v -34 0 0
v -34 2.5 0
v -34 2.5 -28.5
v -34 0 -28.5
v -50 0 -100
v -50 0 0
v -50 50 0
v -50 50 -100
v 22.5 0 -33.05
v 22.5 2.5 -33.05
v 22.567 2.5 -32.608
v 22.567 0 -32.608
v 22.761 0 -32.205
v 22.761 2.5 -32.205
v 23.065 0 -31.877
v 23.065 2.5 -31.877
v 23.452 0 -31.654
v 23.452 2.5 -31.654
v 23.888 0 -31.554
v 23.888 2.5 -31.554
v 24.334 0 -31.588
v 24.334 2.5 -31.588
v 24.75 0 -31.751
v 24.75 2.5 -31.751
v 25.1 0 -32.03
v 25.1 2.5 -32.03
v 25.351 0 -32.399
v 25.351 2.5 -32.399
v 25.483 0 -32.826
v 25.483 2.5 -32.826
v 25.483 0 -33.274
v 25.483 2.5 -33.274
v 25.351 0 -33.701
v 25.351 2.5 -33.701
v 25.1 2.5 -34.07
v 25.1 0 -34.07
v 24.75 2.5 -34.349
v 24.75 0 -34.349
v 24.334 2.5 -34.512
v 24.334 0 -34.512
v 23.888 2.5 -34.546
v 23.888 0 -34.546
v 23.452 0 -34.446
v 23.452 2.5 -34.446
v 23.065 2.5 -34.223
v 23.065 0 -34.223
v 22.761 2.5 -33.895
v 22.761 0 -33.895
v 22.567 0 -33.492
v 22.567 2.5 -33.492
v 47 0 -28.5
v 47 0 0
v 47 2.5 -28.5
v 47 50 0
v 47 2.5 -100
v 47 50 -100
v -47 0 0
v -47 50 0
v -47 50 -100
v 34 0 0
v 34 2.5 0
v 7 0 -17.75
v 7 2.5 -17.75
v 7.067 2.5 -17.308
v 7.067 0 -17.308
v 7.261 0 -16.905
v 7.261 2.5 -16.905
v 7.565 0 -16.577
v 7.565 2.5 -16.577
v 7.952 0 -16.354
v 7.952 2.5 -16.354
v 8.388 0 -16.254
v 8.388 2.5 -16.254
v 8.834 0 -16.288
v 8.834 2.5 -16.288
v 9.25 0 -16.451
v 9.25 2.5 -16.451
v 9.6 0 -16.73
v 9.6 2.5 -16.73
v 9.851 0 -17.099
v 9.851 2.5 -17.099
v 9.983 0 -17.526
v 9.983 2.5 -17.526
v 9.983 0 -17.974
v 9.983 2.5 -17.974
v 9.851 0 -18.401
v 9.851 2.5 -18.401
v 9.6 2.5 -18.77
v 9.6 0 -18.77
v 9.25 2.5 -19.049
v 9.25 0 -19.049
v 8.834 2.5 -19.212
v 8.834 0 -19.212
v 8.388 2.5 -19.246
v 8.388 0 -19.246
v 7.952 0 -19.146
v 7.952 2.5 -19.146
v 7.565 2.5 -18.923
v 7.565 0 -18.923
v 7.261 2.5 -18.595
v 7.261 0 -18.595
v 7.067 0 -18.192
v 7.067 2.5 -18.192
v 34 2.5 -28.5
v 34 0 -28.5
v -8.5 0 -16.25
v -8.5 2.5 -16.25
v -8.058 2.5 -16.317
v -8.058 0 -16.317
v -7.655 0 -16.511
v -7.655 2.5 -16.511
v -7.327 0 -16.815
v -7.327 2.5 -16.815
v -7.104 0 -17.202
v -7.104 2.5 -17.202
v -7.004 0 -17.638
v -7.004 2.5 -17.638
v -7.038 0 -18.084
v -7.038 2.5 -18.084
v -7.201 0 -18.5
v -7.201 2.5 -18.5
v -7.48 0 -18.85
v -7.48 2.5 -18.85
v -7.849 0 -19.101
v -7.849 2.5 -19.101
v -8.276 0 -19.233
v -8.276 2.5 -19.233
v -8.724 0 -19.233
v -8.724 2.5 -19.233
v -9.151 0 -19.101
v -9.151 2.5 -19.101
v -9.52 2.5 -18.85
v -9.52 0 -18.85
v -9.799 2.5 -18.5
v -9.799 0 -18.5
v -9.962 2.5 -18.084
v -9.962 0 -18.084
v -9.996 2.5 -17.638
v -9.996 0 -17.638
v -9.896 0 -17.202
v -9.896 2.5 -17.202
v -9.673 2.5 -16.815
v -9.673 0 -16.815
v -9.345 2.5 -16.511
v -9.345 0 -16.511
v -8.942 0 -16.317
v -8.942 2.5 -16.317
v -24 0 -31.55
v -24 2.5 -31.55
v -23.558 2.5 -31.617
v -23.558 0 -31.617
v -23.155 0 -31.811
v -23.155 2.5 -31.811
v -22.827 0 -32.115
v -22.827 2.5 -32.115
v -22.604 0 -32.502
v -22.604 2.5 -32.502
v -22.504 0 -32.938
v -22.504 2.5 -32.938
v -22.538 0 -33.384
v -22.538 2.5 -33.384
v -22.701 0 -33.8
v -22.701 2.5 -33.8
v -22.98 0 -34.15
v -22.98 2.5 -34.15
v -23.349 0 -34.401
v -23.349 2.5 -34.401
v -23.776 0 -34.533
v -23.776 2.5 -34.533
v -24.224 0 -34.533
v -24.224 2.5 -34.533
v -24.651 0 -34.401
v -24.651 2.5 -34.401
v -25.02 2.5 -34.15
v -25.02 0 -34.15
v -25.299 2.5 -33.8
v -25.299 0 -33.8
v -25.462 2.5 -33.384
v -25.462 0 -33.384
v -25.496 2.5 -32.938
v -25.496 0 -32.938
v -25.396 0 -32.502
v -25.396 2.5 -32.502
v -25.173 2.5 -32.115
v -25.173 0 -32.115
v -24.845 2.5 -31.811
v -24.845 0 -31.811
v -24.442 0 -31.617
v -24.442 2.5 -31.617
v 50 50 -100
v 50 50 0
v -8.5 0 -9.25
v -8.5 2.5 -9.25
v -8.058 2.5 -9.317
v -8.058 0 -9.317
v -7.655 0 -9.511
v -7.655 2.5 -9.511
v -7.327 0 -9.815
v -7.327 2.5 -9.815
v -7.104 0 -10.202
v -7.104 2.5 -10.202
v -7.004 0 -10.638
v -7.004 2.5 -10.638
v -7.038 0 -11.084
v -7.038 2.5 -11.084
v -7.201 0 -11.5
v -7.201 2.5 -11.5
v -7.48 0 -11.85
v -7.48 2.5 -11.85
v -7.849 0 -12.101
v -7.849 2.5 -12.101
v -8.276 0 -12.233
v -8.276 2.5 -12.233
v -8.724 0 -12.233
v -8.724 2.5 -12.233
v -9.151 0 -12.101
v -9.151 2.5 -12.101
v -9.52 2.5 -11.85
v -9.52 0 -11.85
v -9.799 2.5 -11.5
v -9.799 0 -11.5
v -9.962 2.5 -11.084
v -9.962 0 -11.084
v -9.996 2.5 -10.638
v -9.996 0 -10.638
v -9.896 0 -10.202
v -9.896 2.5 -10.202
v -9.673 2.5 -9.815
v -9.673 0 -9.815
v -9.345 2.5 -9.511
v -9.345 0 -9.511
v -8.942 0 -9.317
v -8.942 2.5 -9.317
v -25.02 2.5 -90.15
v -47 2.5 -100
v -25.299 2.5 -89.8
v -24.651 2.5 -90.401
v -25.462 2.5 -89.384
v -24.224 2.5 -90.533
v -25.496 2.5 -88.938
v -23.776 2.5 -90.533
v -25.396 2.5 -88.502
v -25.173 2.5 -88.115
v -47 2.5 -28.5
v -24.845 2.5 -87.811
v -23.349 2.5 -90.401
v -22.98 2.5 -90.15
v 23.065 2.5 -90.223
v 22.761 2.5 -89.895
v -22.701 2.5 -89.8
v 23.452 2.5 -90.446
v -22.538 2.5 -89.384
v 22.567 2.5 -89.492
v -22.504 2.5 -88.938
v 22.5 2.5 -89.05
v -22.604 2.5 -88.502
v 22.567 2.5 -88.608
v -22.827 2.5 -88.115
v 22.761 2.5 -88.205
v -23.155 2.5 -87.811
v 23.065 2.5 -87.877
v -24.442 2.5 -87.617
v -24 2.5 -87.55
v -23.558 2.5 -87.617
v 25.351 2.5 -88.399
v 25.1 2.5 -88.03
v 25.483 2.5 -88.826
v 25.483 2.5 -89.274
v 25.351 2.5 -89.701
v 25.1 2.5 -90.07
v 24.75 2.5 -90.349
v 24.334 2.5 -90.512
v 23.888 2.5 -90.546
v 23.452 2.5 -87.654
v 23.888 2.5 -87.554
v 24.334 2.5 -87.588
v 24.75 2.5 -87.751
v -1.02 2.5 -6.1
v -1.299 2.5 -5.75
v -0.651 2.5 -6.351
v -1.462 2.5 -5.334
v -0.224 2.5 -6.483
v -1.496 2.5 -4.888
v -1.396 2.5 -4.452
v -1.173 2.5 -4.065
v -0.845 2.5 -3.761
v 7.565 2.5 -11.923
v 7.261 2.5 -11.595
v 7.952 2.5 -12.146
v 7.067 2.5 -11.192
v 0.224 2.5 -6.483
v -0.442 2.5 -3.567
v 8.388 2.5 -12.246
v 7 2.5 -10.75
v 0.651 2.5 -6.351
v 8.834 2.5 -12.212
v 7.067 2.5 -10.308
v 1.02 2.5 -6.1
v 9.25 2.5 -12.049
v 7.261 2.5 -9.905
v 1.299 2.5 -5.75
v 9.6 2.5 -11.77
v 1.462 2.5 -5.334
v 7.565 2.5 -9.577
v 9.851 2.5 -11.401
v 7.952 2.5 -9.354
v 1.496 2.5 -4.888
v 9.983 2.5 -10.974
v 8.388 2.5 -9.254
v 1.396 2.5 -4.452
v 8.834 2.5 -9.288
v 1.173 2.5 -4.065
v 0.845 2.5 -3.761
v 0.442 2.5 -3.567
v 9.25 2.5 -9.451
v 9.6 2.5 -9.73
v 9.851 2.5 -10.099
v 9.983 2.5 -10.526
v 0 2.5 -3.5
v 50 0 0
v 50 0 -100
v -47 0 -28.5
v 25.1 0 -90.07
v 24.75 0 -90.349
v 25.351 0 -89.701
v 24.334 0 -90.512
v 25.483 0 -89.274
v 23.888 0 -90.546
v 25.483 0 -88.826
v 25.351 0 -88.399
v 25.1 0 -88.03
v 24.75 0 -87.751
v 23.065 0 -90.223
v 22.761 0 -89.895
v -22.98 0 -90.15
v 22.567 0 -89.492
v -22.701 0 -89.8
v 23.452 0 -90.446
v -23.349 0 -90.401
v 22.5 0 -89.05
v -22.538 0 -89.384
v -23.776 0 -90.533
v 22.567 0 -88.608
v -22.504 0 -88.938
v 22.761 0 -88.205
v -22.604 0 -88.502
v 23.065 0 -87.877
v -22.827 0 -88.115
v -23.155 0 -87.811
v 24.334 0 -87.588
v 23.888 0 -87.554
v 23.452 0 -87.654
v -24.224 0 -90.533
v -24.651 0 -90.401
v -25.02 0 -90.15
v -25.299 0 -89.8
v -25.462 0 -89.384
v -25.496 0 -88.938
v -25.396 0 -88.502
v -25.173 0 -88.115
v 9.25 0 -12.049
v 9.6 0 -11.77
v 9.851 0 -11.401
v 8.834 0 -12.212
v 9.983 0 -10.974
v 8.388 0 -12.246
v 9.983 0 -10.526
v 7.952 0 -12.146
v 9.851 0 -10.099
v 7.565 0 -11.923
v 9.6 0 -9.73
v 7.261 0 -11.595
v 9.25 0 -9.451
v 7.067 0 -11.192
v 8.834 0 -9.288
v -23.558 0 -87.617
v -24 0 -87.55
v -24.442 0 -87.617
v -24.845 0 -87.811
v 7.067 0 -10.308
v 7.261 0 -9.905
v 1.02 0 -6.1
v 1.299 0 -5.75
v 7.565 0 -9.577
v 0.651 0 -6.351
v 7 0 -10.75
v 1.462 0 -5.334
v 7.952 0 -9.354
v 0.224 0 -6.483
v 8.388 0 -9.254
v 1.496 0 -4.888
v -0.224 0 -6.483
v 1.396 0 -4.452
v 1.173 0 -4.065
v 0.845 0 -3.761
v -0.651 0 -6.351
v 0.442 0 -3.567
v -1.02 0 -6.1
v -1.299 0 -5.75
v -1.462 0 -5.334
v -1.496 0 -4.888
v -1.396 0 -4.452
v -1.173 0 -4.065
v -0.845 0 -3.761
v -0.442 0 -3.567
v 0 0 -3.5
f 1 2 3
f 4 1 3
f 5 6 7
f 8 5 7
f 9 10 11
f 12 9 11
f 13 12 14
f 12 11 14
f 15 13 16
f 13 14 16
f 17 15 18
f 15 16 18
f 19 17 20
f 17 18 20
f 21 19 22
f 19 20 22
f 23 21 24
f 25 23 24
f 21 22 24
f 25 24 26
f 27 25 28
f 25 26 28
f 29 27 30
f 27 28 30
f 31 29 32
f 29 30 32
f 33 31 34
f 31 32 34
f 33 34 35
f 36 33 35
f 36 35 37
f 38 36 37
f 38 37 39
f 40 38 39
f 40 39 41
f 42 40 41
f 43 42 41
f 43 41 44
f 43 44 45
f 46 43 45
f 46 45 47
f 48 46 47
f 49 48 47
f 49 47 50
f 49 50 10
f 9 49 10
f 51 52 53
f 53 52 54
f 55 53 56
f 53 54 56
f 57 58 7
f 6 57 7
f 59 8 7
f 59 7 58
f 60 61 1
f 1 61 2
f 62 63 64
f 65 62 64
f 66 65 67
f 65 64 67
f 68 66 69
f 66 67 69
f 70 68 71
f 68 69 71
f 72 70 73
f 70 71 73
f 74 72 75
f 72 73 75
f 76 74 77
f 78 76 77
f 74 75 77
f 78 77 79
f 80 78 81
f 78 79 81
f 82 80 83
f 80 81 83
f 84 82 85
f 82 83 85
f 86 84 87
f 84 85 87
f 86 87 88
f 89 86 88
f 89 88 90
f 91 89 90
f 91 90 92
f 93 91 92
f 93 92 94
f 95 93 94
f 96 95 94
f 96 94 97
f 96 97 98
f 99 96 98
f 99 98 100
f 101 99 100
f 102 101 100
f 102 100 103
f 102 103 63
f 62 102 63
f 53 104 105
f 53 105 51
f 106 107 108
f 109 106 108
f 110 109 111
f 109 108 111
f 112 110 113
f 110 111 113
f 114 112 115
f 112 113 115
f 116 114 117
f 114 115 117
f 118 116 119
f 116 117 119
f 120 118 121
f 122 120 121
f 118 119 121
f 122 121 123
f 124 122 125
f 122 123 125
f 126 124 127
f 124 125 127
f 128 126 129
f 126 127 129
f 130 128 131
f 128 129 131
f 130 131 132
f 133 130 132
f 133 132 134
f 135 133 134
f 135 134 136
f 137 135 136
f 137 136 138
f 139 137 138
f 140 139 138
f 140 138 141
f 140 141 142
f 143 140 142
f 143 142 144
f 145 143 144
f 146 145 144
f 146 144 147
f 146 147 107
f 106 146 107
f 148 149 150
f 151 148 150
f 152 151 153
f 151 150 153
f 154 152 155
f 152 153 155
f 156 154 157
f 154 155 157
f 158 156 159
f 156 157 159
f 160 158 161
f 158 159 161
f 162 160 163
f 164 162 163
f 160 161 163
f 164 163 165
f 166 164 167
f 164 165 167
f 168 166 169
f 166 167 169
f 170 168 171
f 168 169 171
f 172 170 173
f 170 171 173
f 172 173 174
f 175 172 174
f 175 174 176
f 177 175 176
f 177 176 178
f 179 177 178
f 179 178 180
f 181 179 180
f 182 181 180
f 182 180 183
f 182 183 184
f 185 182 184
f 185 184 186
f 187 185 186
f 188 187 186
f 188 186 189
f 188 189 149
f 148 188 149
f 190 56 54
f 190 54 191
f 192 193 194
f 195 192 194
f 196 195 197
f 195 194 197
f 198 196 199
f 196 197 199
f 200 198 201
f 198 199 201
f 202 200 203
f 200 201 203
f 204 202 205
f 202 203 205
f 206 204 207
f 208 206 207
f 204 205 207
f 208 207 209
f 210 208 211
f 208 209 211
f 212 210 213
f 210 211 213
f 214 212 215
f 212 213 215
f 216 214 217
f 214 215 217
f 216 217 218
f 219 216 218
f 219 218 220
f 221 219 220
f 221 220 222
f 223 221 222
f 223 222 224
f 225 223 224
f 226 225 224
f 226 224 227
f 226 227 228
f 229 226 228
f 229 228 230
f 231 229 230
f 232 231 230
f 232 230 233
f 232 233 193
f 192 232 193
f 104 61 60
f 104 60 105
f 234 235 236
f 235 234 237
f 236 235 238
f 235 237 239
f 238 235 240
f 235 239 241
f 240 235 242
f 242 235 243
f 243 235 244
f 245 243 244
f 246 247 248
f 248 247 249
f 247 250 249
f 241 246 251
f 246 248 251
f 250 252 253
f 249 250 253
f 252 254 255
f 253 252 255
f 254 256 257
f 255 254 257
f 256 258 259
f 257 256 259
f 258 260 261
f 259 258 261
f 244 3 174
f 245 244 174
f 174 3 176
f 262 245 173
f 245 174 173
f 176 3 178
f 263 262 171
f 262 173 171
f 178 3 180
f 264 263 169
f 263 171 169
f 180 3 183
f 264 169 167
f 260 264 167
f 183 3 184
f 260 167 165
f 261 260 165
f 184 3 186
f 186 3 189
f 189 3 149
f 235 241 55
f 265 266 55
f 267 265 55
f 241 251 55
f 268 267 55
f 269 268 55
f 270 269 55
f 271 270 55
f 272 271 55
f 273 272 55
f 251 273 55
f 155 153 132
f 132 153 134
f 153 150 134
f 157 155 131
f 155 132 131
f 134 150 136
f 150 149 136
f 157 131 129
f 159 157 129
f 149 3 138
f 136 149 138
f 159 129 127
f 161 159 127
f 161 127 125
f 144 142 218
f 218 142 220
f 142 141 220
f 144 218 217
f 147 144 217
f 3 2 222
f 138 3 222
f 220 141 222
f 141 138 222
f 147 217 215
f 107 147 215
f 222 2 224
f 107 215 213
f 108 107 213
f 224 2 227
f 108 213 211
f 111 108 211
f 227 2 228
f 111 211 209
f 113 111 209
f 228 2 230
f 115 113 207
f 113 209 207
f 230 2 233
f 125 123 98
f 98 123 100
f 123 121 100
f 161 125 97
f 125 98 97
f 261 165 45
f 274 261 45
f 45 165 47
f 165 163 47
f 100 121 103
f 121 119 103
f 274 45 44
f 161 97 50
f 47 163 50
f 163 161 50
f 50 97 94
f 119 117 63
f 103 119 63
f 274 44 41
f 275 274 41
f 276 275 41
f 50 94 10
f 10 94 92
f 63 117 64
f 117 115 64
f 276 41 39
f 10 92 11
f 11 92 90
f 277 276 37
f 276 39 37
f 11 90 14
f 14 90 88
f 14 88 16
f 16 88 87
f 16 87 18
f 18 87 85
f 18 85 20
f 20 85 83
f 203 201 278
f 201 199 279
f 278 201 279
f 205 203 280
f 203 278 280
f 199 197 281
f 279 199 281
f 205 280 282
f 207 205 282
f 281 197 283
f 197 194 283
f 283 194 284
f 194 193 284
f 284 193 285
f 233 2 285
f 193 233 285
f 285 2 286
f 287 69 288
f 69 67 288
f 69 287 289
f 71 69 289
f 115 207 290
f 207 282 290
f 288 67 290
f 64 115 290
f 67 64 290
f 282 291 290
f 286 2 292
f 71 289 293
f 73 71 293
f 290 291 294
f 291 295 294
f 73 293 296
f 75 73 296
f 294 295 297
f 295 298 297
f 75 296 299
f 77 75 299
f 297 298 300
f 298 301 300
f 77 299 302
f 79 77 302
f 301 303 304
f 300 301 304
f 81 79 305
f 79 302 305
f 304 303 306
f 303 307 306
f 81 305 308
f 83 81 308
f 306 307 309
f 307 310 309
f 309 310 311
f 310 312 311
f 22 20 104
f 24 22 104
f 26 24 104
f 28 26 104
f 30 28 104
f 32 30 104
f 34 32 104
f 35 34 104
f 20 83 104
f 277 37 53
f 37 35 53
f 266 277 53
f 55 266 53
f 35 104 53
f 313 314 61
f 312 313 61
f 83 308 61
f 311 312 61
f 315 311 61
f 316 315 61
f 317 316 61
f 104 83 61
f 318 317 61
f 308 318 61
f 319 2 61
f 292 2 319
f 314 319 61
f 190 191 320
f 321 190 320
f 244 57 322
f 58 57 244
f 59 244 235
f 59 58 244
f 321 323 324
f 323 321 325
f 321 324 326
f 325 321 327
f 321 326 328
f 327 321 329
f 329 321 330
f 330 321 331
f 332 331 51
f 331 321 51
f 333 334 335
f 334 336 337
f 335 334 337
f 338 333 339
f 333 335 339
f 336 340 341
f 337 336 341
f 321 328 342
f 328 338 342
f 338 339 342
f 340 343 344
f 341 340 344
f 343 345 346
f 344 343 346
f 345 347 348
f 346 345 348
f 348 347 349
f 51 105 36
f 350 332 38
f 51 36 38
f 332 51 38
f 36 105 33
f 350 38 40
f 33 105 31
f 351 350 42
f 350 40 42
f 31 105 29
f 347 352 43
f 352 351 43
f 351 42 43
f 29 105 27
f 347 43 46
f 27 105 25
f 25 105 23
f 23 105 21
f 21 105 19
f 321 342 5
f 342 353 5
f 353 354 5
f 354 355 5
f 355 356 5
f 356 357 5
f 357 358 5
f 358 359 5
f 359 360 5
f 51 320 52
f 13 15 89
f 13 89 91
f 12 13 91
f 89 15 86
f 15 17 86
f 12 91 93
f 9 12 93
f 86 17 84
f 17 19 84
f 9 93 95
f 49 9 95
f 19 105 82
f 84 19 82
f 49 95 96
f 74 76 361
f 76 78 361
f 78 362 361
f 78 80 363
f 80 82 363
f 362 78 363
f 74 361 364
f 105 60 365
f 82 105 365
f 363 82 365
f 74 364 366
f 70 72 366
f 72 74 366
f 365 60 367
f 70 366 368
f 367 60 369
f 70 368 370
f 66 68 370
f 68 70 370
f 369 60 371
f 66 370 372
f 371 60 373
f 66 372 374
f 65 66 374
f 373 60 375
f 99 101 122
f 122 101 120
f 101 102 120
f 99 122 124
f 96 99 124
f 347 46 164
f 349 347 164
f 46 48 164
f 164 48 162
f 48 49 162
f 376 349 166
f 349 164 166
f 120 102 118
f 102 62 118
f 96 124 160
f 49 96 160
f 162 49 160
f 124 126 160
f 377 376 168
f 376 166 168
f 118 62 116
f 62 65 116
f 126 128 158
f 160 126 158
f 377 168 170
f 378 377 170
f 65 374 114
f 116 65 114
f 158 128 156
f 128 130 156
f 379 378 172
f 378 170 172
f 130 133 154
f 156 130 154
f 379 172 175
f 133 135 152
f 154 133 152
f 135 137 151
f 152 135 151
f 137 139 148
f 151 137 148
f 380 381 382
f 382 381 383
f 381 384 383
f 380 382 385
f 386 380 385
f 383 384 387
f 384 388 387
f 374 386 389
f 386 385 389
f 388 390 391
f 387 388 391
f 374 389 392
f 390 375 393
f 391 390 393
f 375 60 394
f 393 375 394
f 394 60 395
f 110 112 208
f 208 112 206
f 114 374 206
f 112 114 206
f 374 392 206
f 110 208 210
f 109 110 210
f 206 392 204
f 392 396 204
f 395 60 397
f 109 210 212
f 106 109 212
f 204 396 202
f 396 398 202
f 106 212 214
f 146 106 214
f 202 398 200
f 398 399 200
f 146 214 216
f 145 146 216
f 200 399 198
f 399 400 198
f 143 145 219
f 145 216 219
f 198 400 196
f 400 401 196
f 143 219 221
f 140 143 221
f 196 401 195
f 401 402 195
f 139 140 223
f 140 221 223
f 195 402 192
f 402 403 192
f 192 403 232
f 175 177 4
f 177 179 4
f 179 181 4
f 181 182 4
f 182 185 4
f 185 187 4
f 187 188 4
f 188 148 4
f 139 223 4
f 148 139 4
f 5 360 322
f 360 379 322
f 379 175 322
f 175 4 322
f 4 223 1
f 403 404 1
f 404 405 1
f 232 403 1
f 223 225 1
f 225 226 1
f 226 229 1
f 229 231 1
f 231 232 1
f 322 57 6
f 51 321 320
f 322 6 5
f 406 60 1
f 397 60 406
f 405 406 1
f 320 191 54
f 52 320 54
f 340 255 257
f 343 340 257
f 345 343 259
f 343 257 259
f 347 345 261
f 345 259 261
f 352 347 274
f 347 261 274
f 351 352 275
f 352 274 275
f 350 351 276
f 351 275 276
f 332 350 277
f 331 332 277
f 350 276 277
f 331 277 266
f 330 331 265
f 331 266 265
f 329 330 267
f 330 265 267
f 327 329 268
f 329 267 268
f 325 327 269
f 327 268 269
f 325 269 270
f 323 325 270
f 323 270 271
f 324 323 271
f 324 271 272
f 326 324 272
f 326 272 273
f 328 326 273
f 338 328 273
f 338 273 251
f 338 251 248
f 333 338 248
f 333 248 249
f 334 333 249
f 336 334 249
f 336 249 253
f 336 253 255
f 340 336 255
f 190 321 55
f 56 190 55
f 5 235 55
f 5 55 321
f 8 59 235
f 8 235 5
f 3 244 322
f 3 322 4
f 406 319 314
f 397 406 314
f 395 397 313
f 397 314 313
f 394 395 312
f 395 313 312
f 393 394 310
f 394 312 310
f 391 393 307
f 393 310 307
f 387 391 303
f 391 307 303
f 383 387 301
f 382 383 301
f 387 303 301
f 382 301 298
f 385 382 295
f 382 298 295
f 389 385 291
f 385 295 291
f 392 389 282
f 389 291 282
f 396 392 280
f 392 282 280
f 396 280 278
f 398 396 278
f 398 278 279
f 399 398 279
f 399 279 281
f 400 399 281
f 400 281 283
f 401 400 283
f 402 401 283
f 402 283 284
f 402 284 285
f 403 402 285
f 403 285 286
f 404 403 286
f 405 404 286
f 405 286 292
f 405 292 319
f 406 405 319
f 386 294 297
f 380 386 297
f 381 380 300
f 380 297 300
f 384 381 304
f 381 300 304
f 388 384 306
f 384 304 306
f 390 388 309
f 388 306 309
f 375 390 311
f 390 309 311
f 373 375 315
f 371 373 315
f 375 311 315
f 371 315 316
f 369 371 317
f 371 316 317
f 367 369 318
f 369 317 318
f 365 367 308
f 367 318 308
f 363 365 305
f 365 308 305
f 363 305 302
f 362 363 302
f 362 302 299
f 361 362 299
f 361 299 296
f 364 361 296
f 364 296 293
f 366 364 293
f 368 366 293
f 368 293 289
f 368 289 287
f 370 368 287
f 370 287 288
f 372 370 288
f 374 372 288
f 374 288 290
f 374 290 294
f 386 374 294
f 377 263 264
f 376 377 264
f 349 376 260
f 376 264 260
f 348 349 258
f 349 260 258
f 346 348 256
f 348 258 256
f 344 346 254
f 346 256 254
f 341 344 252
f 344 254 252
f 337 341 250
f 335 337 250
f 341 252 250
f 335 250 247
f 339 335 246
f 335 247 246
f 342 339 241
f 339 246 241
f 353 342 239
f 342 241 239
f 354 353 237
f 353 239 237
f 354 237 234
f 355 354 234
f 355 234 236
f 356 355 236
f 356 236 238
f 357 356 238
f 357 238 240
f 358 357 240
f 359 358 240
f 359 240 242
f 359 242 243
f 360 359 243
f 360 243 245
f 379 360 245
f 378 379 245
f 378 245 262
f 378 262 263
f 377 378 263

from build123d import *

# Parameters (mm, degrees)
SALIENTE_EXTRUIR1_DEPTH = 100
CROQUIS2_W              = 13
CROQUIS2_H              = 28.5
CORTAR_EXTRUIR2_DEPTH   = 10
CROQUIS3_R              = 1.5
CORTAR_EXTRUIR3_DEPTH   = 5
CROQUIS4_R              = 1.5
CORTAR_EXTRUIR4_DEPTH   = 10
CROQUIS5_R              = 1.5
CORTAR_EXTRUIR6_DEPTH   = 10


with BuildPart() as part:
    # Croquis1 → Saliente-Extruir1 (new body)
    with BuildSketch(Plane.XY):
        Polygon((50, 0), (-50, 0), (-50, 50), (-47, 50), (-47, 2.5), (47, 2.5), (47, 50), (50, 50), align=None)
    extrude(amount=-SALIENTE_EXTRUIR1_DEPTH)

    # Croquis2 → Cortar-Extruir2 (cut)
    with BuildSketch(Plane(origin=(0, 2.5, 0), x_dir=(1, 0, 0), z_dir=(0, 1, 0))):
        with Locations((-40.5, 14.25)):
            Rectangle(CROQUIS2_W, CROQUIS2_H)
        with Locations((40.5, 14.25)):
            Rectangle(CROQUIS2_W, CROQUIS2_H)
    extrude(amount=-CORTAR_EXTRUIR2_DEPTH, mode=Mode.SUBTRACT)

    # Croquis3 → Cortar-Extruir3 (cut)
    with BuildSketch(Plane(origin=(0, 2.5, 0), x_dir=(1, 0, 0), z_dir=(0, 1, 0))):
        with Locations(Location((0, 5, 0), (0, 0, 270))):
            Circle(CROQUIS3_R)
    extrude(amount=-CORTAR_EXTRUIR3_DEPTH, mode=Mode.SUBTRACT)

    # Croquis4 → Cortar-Extruir4 (cut)
    with BuildSketch(Plane(origin=(0, 2.5, 0), x_dir=(1, 0, 0), z_dir=(0, 1, 0))):
        with Locations(Location((-8.5, 17.75, 0), (0, 0, 270))):
            Circle(CROQUIS4_R)
        with Locations(Location((-8.5, 10.75, 0), (0, 0, 270))):
            Circle(CROQUIS4_R)
        with Locations(Location((8.5, 10.75, 0), (0, 0, 180))):
            Circle(CROQUIS4_R)
        with Locations(Location((8.5, 17.75, 0), (0, 0, 180))):
            Circle(CROQUIS4_R)
    extrude(amount=-CORTAR_EXTRUIR4_DEPTH, mode=Mode.SUBTRACT)

    # Croquis5 → Cortar-Extruir6 (cut)
    with BuildSketch(Plane(origin=(0, 2.5, 0), x_dir=(1, 0, 0), z_dir=(0, 1, 0))):
        with Locations(Location((-24, 89.05, 0), (0, 0, 270))):
            Circle(CROQUIS5_R)
        with Locations(Location((-24, 33.05, 0), (0, 0, 270))):
            Circle(CROQUIS5_R)
        with Locations(Location((24, 33.05, 0), (0, 0, 180))):
            Circle(CROQUIS5_R)
        with Locations(Location((24, 89.05, 0), (0, 0, 180))):
            Circle(CROQUIS5_R)
    extrude(amount=-CORTAR_EXTRUIR6_DEPTH, mode=Mode.SUBTRACT)


solid = part.part
